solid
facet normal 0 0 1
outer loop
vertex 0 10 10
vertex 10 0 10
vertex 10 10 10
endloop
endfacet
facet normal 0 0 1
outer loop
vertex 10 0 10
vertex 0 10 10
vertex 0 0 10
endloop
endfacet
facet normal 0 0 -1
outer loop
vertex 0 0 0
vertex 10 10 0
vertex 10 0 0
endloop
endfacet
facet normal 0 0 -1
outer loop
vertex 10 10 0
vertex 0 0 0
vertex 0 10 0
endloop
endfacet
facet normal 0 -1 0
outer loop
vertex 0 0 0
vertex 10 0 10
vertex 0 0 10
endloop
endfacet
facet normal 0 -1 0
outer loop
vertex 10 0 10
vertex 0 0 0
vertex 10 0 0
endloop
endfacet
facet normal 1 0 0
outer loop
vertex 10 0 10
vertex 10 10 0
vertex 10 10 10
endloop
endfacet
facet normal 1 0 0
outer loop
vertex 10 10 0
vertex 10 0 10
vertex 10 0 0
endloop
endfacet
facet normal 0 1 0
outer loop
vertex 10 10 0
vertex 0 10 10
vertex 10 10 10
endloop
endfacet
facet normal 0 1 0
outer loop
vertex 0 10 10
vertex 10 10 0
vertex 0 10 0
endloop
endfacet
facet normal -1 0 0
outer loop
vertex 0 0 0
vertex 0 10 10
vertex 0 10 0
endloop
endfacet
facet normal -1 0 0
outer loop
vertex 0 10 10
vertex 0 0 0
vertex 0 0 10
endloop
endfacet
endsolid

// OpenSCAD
// cube.scad

// should be 1cm x 1cm x 1cm
cube([10, 10, 10]);
